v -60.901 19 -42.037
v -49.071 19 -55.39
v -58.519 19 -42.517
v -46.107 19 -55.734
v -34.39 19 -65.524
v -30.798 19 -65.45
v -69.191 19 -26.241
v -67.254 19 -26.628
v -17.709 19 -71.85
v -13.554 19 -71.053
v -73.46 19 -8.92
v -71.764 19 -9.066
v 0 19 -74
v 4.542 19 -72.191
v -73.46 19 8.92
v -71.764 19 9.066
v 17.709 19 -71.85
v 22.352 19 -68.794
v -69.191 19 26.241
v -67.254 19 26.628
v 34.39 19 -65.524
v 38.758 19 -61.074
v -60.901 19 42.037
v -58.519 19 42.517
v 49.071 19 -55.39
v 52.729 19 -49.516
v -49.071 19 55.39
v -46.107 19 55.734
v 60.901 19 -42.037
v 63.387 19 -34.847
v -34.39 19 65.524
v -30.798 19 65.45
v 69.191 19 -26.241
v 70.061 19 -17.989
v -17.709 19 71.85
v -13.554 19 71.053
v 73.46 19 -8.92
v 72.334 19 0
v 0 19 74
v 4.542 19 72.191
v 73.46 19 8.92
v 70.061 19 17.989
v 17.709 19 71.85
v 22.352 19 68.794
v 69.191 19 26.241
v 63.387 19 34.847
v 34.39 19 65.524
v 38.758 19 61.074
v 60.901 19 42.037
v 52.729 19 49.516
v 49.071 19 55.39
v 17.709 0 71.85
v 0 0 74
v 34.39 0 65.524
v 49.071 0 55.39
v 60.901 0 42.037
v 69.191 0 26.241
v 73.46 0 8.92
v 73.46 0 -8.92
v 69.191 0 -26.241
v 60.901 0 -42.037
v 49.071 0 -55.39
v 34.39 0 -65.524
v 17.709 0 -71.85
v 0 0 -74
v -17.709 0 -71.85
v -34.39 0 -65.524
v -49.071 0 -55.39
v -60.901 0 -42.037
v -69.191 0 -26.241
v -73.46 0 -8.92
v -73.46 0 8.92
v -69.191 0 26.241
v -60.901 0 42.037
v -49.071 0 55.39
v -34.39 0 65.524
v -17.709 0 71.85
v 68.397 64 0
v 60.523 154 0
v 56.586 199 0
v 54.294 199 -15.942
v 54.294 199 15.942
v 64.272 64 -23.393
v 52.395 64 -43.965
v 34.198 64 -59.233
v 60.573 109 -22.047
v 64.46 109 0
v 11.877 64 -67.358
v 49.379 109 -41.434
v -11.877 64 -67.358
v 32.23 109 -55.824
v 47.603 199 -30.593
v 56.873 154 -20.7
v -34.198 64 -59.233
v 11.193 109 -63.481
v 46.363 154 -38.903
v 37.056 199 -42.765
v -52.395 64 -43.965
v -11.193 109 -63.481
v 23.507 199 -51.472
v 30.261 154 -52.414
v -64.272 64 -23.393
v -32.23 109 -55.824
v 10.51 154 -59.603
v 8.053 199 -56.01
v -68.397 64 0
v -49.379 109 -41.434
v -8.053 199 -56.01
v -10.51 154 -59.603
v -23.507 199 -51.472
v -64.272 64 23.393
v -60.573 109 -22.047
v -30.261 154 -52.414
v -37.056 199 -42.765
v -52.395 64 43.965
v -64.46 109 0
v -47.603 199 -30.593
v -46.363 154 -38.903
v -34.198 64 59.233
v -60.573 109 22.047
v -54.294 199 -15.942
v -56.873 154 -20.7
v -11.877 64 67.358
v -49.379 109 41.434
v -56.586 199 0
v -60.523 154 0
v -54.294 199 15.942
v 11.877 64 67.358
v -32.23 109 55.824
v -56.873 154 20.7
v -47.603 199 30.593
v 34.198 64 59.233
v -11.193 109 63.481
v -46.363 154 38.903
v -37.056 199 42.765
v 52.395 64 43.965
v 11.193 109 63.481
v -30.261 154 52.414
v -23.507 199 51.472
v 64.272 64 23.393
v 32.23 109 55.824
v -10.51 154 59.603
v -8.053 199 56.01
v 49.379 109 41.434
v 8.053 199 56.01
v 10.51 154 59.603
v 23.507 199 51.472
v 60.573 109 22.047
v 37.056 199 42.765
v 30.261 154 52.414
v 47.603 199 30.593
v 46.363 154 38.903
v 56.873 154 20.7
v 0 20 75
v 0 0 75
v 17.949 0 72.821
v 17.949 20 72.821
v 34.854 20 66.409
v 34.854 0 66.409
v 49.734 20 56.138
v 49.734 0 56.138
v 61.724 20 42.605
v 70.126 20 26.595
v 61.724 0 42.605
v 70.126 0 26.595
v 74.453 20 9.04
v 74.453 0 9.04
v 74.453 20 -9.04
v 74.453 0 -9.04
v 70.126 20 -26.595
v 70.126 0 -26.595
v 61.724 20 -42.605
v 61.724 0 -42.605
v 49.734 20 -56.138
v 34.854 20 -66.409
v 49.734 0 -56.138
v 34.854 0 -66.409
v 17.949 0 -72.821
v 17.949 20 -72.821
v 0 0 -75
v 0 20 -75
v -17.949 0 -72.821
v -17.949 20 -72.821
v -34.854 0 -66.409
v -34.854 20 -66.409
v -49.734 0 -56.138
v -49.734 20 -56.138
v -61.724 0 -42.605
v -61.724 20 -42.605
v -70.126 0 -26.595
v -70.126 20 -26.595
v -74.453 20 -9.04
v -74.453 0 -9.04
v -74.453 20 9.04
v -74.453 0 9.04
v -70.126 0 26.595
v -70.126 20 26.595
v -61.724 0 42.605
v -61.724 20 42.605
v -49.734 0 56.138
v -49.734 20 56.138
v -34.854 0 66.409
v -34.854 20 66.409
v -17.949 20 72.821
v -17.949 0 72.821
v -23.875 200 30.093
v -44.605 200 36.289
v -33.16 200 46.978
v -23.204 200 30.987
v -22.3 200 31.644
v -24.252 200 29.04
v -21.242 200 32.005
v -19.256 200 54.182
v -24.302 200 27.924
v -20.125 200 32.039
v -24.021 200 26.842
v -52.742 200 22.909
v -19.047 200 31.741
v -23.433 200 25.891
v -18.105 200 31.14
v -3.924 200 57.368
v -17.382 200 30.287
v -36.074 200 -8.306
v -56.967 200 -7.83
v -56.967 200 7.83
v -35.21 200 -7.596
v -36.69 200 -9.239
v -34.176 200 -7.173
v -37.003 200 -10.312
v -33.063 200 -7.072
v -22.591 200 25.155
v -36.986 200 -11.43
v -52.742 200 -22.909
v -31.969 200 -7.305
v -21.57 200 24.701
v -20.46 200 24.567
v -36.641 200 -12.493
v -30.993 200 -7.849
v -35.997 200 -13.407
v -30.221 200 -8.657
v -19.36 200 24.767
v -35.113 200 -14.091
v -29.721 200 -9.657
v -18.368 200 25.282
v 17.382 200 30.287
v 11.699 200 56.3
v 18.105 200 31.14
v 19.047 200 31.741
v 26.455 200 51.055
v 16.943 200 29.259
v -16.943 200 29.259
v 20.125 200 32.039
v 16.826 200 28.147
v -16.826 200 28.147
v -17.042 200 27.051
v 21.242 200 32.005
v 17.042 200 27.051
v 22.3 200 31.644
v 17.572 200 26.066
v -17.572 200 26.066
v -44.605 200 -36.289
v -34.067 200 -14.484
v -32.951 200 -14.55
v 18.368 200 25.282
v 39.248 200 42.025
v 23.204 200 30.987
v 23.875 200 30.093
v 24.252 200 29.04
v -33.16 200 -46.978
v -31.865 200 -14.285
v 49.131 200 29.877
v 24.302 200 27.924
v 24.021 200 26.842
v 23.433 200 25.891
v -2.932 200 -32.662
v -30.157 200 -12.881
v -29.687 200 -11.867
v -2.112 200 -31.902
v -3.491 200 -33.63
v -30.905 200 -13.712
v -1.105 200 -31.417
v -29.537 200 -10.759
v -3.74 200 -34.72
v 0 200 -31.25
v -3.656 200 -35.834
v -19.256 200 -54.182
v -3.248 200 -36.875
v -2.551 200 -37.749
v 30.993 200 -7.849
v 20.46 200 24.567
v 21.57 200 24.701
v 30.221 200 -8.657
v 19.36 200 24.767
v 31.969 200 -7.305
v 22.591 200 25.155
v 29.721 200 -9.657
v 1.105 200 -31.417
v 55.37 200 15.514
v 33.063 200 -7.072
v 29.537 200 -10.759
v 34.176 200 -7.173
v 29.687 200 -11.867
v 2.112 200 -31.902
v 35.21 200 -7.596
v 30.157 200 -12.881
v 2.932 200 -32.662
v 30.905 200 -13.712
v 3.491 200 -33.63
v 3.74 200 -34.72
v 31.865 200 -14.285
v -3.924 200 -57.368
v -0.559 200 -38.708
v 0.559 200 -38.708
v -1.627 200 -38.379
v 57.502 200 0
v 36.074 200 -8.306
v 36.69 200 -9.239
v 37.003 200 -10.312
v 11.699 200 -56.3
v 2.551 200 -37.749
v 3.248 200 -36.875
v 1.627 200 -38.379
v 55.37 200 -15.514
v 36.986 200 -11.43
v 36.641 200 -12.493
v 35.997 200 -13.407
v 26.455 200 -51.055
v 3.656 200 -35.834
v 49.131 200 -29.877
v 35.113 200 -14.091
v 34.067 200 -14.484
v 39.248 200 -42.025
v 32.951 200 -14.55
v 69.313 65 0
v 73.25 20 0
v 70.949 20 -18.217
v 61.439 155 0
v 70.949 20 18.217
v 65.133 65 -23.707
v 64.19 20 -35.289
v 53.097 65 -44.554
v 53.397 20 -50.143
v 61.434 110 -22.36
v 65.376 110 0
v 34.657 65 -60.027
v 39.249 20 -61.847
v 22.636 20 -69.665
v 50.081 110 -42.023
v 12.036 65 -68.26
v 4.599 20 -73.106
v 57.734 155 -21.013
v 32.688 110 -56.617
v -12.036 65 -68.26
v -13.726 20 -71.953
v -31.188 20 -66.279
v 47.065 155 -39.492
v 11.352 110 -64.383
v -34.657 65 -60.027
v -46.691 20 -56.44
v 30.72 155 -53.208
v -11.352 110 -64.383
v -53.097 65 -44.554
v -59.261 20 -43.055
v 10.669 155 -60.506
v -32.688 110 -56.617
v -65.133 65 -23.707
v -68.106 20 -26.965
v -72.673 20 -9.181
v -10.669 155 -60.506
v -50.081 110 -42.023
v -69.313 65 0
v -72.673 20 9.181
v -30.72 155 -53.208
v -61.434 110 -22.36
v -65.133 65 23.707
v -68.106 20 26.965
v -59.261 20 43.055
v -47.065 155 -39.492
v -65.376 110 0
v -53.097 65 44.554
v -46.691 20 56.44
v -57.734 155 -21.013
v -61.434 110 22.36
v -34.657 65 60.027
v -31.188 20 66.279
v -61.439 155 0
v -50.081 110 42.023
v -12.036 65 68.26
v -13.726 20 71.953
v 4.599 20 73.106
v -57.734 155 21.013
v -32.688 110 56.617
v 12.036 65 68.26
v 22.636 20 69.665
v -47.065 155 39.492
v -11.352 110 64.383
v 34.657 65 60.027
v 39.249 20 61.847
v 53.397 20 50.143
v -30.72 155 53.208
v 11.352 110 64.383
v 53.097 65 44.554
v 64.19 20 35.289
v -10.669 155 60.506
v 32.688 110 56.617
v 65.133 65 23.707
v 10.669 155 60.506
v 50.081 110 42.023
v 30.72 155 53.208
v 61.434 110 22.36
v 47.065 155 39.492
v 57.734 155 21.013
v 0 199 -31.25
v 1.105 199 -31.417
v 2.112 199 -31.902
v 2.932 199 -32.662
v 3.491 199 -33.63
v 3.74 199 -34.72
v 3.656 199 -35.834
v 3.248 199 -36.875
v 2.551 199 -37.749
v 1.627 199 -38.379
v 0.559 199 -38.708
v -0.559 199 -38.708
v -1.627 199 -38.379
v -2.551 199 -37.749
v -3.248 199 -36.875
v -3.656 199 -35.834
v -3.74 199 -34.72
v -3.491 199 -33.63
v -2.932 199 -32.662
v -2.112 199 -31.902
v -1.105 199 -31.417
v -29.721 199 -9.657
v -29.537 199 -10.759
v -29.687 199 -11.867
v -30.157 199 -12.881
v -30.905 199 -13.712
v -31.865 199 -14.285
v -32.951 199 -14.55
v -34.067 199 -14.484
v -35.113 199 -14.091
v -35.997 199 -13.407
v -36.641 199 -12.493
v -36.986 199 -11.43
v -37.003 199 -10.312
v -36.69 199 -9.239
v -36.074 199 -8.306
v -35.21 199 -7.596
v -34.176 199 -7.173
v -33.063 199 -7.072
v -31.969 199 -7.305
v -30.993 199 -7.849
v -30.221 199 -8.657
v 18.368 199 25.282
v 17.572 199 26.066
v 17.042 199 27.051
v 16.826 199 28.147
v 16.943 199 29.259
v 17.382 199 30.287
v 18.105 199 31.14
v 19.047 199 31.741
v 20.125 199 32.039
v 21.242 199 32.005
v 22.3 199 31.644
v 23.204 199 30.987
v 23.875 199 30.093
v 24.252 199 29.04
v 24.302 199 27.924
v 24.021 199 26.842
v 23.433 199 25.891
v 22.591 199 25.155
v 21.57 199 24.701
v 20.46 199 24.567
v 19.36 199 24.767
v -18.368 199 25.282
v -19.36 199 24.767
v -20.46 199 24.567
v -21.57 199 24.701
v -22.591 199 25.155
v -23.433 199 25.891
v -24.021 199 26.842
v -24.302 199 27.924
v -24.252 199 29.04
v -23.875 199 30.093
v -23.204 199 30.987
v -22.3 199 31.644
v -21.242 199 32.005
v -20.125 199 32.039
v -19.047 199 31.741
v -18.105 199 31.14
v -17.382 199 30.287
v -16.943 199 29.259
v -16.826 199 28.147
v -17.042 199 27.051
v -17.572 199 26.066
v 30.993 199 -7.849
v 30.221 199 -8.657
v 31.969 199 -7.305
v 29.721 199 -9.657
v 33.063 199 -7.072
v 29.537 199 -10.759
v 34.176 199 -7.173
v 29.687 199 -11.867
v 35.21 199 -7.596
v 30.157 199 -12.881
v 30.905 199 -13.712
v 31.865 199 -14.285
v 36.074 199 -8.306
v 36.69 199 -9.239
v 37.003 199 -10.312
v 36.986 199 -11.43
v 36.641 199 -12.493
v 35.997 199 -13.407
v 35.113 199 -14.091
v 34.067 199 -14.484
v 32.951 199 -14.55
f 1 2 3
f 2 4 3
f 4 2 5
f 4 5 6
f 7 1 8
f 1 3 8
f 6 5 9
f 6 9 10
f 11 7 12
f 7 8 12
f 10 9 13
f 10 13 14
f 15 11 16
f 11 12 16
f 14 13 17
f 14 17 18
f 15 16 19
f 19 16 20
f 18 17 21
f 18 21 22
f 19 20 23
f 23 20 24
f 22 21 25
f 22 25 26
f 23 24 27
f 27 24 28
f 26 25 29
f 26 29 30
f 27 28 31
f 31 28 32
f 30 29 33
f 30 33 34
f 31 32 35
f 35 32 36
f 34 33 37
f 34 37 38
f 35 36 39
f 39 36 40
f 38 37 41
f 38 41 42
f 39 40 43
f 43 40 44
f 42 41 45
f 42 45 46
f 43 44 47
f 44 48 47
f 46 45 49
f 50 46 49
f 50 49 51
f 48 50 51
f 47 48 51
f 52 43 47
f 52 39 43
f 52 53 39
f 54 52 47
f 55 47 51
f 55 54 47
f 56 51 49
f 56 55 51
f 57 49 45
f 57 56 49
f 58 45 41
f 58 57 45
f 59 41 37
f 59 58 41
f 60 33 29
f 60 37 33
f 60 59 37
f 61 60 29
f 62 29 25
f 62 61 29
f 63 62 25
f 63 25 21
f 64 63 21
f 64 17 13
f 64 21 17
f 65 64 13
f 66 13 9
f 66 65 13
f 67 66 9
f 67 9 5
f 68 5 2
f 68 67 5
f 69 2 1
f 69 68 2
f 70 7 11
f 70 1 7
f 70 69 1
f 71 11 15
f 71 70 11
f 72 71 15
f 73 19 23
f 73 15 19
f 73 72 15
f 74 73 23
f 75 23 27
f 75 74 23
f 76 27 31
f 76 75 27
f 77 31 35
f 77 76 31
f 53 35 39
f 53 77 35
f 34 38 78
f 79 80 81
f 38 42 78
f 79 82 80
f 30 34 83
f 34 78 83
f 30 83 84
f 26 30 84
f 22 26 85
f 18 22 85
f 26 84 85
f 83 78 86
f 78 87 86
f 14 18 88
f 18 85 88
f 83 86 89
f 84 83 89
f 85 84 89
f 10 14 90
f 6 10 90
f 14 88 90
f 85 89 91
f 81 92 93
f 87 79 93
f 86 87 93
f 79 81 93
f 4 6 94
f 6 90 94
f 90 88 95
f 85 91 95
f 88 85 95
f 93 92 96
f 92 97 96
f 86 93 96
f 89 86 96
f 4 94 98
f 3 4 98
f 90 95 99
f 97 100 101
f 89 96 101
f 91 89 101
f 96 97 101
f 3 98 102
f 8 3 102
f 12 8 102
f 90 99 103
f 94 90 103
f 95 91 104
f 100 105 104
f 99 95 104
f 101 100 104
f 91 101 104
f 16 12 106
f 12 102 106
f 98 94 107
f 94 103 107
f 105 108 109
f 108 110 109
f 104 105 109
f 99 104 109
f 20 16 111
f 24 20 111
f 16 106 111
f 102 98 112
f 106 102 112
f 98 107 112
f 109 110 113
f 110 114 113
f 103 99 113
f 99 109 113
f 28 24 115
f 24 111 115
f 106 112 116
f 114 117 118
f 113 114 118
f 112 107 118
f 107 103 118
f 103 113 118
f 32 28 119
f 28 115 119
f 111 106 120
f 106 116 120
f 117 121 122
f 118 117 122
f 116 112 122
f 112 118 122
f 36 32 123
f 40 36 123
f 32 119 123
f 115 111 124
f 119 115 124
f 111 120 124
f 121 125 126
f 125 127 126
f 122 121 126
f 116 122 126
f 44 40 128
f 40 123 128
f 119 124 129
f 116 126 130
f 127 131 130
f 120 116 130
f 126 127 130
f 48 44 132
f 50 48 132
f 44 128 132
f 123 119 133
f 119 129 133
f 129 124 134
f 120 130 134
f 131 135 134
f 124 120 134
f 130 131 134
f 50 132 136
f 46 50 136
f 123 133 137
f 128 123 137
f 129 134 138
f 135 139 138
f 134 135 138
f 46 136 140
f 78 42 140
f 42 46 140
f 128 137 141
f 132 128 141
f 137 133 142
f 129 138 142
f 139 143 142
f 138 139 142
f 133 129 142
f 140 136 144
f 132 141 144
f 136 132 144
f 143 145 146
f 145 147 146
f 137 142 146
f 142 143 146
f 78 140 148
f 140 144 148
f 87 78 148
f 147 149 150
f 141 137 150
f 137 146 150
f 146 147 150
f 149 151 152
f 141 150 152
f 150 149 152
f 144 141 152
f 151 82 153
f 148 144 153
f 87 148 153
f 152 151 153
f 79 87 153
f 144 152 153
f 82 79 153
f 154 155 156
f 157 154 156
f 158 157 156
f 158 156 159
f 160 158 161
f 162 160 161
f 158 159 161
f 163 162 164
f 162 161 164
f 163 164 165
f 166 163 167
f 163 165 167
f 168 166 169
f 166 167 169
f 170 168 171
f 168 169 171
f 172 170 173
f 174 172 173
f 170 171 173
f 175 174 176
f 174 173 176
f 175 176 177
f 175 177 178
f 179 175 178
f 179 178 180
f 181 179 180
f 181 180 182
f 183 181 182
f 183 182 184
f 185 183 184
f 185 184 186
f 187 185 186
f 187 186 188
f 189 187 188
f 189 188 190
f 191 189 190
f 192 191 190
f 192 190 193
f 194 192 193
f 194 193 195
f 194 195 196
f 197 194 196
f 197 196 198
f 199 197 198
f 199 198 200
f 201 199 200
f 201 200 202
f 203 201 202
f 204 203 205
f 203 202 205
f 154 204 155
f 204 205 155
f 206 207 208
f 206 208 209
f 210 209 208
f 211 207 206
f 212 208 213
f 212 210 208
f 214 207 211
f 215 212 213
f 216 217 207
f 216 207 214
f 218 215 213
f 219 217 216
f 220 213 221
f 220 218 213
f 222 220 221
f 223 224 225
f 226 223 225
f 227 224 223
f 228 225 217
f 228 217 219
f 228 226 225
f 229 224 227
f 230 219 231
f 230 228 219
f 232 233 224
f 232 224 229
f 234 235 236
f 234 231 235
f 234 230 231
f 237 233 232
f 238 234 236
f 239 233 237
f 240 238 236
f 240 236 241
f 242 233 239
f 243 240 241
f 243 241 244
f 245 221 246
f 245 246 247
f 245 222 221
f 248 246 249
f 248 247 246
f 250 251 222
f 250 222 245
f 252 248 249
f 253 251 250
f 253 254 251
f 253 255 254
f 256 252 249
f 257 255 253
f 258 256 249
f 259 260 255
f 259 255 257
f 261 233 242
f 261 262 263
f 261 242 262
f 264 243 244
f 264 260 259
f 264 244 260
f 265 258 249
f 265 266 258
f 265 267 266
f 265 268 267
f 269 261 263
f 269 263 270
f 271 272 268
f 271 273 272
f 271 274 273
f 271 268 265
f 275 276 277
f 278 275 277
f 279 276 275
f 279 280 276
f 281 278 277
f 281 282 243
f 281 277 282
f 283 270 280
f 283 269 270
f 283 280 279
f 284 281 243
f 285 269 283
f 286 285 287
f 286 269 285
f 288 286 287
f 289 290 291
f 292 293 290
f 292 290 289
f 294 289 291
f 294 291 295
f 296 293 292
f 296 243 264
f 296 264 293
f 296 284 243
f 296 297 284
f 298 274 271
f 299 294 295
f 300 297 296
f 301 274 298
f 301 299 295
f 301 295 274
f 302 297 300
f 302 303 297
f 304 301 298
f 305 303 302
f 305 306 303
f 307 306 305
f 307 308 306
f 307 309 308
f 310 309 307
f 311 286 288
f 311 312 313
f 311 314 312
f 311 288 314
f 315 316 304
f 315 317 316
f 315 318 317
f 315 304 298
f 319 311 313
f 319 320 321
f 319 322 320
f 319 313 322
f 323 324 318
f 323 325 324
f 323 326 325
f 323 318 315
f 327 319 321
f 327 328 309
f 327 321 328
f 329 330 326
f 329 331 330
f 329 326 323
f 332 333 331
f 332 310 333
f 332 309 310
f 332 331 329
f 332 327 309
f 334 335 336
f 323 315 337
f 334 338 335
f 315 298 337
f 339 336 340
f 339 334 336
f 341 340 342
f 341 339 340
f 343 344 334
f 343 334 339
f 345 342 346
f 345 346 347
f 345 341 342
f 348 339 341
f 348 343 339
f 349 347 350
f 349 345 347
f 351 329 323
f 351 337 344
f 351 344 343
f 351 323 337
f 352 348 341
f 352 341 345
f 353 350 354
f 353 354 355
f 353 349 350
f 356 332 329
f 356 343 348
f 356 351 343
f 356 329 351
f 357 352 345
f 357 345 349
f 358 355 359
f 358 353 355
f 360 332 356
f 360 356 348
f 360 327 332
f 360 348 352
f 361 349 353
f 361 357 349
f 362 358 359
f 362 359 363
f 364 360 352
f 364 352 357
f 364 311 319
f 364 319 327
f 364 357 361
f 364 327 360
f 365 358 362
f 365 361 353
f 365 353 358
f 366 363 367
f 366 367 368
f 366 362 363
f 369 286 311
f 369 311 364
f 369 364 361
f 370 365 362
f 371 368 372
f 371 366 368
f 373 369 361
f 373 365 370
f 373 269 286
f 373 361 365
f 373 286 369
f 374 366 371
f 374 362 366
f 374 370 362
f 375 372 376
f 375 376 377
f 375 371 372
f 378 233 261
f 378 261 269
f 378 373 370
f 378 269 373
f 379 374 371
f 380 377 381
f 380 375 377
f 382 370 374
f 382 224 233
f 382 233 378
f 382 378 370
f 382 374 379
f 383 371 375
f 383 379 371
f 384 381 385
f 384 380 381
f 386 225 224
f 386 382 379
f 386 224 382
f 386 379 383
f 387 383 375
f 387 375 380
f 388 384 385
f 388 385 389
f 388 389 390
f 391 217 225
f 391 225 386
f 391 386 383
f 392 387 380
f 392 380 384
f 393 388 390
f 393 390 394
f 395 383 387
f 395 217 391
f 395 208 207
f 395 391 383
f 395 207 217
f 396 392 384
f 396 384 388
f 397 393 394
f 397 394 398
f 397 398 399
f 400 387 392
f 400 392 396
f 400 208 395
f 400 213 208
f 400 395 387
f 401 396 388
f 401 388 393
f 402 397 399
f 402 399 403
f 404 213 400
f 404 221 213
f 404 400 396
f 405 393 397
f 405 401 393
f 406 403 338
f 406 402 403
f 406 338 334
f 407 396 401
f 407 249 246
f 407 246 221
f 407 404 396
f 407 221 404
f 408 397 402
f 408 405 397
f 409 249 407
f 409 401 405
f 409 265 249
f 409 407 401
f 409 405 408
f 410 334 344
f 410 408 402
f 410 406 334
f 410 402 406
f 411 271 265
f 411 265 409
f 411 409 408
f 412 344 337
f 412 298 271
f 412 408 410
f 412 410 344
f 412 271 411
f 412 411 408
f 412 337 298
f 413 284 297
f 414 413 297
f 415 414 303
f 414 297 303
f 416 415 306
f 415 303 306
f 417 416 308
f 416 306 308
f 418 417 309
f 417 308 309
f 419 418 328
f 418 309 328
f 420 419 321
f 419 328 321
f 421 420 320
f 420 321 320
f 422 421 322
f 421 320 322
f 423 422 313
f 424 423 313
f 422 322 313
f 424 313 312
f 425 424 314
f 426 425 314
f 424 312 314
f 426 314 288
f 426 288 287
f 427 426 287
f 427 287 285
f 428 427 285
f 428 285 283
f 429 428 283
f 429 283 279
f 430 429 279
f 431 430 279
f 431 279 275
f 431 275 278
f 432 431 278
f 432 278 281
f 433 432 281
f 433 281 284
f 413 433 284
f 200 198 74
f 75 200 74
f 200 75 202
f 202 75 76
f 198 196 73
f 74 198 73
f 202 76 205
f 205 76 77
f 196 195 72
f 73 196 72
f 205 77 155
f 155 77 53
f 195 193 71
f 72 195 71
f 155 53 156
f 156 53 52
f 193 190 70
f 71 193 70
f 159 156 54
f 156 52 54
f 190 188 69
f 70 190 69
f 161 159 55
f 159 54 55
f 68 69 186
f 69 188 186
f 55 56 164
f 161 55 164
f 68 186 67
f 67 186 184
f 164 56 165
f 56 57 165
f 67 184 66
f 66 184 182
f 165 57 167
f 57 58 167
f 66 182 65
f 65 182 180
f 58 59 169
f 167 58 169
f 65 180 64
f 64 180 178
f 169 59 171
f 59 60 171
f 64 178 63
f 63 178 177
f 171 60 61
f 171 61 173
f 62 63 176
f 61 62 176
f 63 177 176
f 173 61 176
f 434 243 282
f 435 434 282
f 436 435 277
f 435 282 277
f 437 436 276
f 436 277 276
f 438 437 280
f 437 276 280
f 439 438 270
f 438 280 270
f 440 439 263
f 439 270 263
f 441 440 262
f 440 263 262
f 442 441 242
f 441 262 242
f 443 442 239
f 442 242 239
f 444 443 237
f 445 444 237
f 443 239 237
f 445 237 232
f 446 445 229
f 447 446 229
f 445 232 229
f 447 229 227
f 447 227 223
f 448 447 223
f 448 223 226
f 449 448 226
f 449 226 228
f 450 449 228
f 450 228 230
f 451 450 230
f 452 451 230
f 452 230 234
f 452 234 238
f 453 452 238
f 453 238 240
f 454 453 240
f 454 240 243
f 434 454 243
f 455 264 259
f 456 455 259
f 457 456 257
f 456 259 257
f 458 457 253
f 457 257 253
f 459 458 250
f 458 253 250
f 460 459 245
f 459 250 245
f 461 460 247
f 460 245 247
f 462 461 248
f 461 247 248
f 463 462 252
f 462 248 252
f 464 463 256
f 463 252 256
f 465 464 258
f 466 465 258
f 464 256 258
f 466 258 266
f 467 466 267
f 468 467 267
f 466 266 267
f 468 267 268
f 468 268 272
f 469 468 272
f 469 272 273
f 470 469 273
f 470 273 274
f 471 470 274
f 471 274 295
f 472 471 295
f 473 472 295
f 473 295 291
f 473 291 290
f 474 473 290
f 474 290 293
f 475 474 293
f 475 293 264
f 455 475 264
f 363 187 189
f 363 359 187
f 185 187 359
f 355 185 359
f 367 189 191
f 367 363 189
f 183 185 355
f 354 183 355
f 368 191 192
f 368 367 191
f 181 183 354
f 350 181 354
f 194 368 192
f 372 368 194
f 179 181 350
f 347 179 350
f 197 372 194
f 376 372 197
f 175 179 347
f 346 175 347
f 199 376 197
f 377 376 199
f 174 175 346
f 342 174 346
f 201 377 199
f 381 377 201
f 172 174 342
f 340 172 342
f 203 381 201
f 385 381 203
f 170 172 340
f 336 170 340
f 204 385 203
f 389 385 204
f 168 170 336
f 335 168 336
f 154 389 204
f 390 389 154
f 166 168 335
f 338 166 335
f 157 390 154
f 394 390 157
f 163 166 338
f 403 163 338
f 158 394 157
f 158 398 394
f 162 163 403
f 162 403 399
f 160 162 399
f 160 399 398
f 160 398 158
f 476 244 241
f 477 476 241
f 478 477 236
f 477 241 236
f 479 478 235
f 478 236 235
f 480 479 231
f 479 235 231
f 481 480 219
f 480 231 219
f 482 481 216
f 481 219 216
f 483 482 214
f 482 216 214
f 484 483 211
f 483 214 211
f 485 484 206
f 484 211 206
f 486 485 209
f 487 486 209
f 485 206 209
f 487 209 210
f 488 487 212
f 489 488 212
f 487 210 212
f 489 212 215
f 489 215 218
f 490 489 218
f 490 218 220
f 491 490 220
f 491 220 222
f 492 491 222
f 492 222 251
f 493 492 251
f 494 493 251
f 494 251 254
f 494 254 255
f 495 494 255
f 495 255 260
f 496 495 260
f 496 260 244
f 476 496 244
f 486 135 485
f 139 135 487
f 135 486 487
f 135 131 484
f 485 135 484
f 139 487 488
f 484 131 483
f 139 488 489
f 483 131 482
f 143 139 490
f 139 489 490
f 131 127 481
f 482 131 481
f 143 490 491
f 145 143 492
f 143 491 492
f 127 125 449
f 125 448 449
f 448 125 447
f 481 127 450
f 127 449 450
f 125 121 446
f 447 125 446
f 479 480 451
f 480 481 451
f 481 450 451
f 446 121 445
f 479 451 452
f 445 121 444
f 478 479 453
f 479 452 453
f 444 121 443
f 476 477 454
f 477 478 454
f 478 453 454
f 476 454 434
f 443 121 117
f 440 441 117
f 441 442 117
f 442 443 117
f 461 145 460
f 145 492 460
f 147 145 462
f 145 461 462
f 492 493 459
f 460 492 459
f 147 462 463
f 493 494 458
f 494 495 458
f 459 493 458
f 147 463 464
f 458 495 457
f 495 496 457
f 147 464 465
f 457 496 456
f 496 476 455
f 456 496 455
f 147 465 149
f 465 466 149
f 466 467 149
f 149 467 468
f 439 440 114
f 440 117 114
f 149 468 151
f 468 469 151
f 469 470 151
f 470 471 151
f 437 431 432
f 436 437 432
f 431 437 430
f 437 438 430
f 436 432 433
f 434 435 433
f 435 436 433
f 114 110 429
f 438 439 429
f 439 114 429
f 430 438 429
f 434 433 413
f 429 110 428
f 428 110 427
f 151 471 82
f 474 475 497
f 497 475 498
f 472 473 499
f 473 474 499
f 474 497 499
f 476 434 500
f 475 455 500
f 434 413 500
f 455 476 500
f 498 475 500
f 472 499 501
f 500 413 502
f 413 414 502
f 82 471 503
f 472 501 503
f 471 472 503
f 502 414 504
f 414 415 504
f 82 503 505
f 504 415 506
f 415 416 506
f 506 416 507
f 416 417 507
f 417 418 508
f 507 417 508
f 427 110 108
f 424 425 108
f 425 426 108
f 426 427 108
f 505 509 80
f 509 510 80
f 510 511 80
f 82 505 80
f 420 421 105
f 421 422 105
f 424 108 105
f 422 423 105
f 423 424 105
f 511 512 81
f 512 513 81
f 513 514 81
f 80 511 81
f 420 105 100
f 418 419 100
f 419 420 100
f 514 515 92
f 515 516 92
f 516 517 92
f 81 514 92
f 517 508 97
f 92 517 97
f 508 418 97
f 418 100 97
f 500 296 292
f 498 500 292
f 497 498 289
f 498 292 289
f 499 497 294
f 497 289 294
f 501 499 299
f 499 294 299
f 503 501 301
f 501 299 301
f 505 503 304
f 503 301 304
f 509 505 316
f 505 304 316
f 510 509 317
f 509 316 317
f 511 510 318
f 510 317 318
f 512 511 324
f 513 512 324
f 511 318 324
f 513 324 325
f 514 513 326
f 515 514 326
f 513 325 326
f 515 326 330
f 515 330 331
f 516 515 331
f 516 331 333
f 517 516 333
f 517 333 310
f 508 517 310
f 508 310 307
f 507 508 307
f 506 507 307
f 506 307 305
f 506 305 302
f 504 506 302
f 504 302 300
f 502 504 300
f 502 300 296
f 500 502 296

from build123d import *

# Parameters (mm, degrees)
SKETCH1_R           = 75
BOSS_EXTRUDE1_DEPTH = 200
BOSS_EXTRUDE1_TAPER = 5
SKETCH2_R           = 75
BOSS_EXTRUDE2_DEPTH = 20
SHELL2_T            = -1
CUT_EXTRUDE1_REACH  = 228.385
SKETCH3_R           = 3.75
CIRPATTERN1_COUNT   = 5


with BuildPart() as part:
    # Sketch1 → Boss-Extrude1 (new body)
    with BuildSketch(Plane(origin=(0, 0, 0), x_dir=(1, 0, 0), z_dir=(0, 1, 0))):
        Circle(SKETCH1_R)
    extrude(amount=BOSS_EXTRUDE1_DEPTH, taper=BOSS_EXTRUDE1_TAPER)

    # Sketch2 → Boss-Extrude2 (add)
    with BuildSketch(Plane(origin=(0, 0, 0), x_dir=(1, 0, 0), z_dir=(0, 1, 0))):
        with Locations(Location((0, 0, 0), (0, 0, 270))):
            Circle(SKETCH2_R)
    extrude(amount=BOSS_EXTRUDE2_DEPTH)

    # Shell2
    shell2_openings = [part.faces().sort_by_distance(p)[0] for p in [
        (0, 0, 0),
    ]]
    offset(amount=SHELL2_T, openings=shell2_openings, kind=Kind.INTERSECTION)

    # Sketch3 → Cut-Extrude1 (cut, up to next)
    with BuildSketch(Plane(origin=(0, 200, 0), x_dir=(1, 0, 0), z_dir=(0, 1, 0)), mode=Mode.PRIVATE) as cut_extrude1_sk1:
        with Locations(Location((0, 35, 0), (0, 0, 270))):
            Circle(SKETCH3_R)
    cut_extrude1_tool1 = extrude(cut_extrude1_sk1.sketch, amount=-CUT_EXTRUDE1_REACH, mode=Mode.PRIVATE) & part.part
    cut_extrude1 = cut_extrude1_tool1.solids().sort_by_distance((0, 200, -35))[0]
    add(cut_extrude1, mode=Mode.SUBTRACT)

    # CirPattern1: Cut-Extrude1 ×5 about axis
    cirpattern1_axis = Axis((0, 0, 0), (0, 1, 0))
    for i in range(1, CIRPATTERN1_COUNT):
        add(cut_extrude1.rotate(cirpattern1_axis, i * 360 / CIRPATTERN1_COUNT), mode=Mode.SUBTRACT)


solid = part.part
